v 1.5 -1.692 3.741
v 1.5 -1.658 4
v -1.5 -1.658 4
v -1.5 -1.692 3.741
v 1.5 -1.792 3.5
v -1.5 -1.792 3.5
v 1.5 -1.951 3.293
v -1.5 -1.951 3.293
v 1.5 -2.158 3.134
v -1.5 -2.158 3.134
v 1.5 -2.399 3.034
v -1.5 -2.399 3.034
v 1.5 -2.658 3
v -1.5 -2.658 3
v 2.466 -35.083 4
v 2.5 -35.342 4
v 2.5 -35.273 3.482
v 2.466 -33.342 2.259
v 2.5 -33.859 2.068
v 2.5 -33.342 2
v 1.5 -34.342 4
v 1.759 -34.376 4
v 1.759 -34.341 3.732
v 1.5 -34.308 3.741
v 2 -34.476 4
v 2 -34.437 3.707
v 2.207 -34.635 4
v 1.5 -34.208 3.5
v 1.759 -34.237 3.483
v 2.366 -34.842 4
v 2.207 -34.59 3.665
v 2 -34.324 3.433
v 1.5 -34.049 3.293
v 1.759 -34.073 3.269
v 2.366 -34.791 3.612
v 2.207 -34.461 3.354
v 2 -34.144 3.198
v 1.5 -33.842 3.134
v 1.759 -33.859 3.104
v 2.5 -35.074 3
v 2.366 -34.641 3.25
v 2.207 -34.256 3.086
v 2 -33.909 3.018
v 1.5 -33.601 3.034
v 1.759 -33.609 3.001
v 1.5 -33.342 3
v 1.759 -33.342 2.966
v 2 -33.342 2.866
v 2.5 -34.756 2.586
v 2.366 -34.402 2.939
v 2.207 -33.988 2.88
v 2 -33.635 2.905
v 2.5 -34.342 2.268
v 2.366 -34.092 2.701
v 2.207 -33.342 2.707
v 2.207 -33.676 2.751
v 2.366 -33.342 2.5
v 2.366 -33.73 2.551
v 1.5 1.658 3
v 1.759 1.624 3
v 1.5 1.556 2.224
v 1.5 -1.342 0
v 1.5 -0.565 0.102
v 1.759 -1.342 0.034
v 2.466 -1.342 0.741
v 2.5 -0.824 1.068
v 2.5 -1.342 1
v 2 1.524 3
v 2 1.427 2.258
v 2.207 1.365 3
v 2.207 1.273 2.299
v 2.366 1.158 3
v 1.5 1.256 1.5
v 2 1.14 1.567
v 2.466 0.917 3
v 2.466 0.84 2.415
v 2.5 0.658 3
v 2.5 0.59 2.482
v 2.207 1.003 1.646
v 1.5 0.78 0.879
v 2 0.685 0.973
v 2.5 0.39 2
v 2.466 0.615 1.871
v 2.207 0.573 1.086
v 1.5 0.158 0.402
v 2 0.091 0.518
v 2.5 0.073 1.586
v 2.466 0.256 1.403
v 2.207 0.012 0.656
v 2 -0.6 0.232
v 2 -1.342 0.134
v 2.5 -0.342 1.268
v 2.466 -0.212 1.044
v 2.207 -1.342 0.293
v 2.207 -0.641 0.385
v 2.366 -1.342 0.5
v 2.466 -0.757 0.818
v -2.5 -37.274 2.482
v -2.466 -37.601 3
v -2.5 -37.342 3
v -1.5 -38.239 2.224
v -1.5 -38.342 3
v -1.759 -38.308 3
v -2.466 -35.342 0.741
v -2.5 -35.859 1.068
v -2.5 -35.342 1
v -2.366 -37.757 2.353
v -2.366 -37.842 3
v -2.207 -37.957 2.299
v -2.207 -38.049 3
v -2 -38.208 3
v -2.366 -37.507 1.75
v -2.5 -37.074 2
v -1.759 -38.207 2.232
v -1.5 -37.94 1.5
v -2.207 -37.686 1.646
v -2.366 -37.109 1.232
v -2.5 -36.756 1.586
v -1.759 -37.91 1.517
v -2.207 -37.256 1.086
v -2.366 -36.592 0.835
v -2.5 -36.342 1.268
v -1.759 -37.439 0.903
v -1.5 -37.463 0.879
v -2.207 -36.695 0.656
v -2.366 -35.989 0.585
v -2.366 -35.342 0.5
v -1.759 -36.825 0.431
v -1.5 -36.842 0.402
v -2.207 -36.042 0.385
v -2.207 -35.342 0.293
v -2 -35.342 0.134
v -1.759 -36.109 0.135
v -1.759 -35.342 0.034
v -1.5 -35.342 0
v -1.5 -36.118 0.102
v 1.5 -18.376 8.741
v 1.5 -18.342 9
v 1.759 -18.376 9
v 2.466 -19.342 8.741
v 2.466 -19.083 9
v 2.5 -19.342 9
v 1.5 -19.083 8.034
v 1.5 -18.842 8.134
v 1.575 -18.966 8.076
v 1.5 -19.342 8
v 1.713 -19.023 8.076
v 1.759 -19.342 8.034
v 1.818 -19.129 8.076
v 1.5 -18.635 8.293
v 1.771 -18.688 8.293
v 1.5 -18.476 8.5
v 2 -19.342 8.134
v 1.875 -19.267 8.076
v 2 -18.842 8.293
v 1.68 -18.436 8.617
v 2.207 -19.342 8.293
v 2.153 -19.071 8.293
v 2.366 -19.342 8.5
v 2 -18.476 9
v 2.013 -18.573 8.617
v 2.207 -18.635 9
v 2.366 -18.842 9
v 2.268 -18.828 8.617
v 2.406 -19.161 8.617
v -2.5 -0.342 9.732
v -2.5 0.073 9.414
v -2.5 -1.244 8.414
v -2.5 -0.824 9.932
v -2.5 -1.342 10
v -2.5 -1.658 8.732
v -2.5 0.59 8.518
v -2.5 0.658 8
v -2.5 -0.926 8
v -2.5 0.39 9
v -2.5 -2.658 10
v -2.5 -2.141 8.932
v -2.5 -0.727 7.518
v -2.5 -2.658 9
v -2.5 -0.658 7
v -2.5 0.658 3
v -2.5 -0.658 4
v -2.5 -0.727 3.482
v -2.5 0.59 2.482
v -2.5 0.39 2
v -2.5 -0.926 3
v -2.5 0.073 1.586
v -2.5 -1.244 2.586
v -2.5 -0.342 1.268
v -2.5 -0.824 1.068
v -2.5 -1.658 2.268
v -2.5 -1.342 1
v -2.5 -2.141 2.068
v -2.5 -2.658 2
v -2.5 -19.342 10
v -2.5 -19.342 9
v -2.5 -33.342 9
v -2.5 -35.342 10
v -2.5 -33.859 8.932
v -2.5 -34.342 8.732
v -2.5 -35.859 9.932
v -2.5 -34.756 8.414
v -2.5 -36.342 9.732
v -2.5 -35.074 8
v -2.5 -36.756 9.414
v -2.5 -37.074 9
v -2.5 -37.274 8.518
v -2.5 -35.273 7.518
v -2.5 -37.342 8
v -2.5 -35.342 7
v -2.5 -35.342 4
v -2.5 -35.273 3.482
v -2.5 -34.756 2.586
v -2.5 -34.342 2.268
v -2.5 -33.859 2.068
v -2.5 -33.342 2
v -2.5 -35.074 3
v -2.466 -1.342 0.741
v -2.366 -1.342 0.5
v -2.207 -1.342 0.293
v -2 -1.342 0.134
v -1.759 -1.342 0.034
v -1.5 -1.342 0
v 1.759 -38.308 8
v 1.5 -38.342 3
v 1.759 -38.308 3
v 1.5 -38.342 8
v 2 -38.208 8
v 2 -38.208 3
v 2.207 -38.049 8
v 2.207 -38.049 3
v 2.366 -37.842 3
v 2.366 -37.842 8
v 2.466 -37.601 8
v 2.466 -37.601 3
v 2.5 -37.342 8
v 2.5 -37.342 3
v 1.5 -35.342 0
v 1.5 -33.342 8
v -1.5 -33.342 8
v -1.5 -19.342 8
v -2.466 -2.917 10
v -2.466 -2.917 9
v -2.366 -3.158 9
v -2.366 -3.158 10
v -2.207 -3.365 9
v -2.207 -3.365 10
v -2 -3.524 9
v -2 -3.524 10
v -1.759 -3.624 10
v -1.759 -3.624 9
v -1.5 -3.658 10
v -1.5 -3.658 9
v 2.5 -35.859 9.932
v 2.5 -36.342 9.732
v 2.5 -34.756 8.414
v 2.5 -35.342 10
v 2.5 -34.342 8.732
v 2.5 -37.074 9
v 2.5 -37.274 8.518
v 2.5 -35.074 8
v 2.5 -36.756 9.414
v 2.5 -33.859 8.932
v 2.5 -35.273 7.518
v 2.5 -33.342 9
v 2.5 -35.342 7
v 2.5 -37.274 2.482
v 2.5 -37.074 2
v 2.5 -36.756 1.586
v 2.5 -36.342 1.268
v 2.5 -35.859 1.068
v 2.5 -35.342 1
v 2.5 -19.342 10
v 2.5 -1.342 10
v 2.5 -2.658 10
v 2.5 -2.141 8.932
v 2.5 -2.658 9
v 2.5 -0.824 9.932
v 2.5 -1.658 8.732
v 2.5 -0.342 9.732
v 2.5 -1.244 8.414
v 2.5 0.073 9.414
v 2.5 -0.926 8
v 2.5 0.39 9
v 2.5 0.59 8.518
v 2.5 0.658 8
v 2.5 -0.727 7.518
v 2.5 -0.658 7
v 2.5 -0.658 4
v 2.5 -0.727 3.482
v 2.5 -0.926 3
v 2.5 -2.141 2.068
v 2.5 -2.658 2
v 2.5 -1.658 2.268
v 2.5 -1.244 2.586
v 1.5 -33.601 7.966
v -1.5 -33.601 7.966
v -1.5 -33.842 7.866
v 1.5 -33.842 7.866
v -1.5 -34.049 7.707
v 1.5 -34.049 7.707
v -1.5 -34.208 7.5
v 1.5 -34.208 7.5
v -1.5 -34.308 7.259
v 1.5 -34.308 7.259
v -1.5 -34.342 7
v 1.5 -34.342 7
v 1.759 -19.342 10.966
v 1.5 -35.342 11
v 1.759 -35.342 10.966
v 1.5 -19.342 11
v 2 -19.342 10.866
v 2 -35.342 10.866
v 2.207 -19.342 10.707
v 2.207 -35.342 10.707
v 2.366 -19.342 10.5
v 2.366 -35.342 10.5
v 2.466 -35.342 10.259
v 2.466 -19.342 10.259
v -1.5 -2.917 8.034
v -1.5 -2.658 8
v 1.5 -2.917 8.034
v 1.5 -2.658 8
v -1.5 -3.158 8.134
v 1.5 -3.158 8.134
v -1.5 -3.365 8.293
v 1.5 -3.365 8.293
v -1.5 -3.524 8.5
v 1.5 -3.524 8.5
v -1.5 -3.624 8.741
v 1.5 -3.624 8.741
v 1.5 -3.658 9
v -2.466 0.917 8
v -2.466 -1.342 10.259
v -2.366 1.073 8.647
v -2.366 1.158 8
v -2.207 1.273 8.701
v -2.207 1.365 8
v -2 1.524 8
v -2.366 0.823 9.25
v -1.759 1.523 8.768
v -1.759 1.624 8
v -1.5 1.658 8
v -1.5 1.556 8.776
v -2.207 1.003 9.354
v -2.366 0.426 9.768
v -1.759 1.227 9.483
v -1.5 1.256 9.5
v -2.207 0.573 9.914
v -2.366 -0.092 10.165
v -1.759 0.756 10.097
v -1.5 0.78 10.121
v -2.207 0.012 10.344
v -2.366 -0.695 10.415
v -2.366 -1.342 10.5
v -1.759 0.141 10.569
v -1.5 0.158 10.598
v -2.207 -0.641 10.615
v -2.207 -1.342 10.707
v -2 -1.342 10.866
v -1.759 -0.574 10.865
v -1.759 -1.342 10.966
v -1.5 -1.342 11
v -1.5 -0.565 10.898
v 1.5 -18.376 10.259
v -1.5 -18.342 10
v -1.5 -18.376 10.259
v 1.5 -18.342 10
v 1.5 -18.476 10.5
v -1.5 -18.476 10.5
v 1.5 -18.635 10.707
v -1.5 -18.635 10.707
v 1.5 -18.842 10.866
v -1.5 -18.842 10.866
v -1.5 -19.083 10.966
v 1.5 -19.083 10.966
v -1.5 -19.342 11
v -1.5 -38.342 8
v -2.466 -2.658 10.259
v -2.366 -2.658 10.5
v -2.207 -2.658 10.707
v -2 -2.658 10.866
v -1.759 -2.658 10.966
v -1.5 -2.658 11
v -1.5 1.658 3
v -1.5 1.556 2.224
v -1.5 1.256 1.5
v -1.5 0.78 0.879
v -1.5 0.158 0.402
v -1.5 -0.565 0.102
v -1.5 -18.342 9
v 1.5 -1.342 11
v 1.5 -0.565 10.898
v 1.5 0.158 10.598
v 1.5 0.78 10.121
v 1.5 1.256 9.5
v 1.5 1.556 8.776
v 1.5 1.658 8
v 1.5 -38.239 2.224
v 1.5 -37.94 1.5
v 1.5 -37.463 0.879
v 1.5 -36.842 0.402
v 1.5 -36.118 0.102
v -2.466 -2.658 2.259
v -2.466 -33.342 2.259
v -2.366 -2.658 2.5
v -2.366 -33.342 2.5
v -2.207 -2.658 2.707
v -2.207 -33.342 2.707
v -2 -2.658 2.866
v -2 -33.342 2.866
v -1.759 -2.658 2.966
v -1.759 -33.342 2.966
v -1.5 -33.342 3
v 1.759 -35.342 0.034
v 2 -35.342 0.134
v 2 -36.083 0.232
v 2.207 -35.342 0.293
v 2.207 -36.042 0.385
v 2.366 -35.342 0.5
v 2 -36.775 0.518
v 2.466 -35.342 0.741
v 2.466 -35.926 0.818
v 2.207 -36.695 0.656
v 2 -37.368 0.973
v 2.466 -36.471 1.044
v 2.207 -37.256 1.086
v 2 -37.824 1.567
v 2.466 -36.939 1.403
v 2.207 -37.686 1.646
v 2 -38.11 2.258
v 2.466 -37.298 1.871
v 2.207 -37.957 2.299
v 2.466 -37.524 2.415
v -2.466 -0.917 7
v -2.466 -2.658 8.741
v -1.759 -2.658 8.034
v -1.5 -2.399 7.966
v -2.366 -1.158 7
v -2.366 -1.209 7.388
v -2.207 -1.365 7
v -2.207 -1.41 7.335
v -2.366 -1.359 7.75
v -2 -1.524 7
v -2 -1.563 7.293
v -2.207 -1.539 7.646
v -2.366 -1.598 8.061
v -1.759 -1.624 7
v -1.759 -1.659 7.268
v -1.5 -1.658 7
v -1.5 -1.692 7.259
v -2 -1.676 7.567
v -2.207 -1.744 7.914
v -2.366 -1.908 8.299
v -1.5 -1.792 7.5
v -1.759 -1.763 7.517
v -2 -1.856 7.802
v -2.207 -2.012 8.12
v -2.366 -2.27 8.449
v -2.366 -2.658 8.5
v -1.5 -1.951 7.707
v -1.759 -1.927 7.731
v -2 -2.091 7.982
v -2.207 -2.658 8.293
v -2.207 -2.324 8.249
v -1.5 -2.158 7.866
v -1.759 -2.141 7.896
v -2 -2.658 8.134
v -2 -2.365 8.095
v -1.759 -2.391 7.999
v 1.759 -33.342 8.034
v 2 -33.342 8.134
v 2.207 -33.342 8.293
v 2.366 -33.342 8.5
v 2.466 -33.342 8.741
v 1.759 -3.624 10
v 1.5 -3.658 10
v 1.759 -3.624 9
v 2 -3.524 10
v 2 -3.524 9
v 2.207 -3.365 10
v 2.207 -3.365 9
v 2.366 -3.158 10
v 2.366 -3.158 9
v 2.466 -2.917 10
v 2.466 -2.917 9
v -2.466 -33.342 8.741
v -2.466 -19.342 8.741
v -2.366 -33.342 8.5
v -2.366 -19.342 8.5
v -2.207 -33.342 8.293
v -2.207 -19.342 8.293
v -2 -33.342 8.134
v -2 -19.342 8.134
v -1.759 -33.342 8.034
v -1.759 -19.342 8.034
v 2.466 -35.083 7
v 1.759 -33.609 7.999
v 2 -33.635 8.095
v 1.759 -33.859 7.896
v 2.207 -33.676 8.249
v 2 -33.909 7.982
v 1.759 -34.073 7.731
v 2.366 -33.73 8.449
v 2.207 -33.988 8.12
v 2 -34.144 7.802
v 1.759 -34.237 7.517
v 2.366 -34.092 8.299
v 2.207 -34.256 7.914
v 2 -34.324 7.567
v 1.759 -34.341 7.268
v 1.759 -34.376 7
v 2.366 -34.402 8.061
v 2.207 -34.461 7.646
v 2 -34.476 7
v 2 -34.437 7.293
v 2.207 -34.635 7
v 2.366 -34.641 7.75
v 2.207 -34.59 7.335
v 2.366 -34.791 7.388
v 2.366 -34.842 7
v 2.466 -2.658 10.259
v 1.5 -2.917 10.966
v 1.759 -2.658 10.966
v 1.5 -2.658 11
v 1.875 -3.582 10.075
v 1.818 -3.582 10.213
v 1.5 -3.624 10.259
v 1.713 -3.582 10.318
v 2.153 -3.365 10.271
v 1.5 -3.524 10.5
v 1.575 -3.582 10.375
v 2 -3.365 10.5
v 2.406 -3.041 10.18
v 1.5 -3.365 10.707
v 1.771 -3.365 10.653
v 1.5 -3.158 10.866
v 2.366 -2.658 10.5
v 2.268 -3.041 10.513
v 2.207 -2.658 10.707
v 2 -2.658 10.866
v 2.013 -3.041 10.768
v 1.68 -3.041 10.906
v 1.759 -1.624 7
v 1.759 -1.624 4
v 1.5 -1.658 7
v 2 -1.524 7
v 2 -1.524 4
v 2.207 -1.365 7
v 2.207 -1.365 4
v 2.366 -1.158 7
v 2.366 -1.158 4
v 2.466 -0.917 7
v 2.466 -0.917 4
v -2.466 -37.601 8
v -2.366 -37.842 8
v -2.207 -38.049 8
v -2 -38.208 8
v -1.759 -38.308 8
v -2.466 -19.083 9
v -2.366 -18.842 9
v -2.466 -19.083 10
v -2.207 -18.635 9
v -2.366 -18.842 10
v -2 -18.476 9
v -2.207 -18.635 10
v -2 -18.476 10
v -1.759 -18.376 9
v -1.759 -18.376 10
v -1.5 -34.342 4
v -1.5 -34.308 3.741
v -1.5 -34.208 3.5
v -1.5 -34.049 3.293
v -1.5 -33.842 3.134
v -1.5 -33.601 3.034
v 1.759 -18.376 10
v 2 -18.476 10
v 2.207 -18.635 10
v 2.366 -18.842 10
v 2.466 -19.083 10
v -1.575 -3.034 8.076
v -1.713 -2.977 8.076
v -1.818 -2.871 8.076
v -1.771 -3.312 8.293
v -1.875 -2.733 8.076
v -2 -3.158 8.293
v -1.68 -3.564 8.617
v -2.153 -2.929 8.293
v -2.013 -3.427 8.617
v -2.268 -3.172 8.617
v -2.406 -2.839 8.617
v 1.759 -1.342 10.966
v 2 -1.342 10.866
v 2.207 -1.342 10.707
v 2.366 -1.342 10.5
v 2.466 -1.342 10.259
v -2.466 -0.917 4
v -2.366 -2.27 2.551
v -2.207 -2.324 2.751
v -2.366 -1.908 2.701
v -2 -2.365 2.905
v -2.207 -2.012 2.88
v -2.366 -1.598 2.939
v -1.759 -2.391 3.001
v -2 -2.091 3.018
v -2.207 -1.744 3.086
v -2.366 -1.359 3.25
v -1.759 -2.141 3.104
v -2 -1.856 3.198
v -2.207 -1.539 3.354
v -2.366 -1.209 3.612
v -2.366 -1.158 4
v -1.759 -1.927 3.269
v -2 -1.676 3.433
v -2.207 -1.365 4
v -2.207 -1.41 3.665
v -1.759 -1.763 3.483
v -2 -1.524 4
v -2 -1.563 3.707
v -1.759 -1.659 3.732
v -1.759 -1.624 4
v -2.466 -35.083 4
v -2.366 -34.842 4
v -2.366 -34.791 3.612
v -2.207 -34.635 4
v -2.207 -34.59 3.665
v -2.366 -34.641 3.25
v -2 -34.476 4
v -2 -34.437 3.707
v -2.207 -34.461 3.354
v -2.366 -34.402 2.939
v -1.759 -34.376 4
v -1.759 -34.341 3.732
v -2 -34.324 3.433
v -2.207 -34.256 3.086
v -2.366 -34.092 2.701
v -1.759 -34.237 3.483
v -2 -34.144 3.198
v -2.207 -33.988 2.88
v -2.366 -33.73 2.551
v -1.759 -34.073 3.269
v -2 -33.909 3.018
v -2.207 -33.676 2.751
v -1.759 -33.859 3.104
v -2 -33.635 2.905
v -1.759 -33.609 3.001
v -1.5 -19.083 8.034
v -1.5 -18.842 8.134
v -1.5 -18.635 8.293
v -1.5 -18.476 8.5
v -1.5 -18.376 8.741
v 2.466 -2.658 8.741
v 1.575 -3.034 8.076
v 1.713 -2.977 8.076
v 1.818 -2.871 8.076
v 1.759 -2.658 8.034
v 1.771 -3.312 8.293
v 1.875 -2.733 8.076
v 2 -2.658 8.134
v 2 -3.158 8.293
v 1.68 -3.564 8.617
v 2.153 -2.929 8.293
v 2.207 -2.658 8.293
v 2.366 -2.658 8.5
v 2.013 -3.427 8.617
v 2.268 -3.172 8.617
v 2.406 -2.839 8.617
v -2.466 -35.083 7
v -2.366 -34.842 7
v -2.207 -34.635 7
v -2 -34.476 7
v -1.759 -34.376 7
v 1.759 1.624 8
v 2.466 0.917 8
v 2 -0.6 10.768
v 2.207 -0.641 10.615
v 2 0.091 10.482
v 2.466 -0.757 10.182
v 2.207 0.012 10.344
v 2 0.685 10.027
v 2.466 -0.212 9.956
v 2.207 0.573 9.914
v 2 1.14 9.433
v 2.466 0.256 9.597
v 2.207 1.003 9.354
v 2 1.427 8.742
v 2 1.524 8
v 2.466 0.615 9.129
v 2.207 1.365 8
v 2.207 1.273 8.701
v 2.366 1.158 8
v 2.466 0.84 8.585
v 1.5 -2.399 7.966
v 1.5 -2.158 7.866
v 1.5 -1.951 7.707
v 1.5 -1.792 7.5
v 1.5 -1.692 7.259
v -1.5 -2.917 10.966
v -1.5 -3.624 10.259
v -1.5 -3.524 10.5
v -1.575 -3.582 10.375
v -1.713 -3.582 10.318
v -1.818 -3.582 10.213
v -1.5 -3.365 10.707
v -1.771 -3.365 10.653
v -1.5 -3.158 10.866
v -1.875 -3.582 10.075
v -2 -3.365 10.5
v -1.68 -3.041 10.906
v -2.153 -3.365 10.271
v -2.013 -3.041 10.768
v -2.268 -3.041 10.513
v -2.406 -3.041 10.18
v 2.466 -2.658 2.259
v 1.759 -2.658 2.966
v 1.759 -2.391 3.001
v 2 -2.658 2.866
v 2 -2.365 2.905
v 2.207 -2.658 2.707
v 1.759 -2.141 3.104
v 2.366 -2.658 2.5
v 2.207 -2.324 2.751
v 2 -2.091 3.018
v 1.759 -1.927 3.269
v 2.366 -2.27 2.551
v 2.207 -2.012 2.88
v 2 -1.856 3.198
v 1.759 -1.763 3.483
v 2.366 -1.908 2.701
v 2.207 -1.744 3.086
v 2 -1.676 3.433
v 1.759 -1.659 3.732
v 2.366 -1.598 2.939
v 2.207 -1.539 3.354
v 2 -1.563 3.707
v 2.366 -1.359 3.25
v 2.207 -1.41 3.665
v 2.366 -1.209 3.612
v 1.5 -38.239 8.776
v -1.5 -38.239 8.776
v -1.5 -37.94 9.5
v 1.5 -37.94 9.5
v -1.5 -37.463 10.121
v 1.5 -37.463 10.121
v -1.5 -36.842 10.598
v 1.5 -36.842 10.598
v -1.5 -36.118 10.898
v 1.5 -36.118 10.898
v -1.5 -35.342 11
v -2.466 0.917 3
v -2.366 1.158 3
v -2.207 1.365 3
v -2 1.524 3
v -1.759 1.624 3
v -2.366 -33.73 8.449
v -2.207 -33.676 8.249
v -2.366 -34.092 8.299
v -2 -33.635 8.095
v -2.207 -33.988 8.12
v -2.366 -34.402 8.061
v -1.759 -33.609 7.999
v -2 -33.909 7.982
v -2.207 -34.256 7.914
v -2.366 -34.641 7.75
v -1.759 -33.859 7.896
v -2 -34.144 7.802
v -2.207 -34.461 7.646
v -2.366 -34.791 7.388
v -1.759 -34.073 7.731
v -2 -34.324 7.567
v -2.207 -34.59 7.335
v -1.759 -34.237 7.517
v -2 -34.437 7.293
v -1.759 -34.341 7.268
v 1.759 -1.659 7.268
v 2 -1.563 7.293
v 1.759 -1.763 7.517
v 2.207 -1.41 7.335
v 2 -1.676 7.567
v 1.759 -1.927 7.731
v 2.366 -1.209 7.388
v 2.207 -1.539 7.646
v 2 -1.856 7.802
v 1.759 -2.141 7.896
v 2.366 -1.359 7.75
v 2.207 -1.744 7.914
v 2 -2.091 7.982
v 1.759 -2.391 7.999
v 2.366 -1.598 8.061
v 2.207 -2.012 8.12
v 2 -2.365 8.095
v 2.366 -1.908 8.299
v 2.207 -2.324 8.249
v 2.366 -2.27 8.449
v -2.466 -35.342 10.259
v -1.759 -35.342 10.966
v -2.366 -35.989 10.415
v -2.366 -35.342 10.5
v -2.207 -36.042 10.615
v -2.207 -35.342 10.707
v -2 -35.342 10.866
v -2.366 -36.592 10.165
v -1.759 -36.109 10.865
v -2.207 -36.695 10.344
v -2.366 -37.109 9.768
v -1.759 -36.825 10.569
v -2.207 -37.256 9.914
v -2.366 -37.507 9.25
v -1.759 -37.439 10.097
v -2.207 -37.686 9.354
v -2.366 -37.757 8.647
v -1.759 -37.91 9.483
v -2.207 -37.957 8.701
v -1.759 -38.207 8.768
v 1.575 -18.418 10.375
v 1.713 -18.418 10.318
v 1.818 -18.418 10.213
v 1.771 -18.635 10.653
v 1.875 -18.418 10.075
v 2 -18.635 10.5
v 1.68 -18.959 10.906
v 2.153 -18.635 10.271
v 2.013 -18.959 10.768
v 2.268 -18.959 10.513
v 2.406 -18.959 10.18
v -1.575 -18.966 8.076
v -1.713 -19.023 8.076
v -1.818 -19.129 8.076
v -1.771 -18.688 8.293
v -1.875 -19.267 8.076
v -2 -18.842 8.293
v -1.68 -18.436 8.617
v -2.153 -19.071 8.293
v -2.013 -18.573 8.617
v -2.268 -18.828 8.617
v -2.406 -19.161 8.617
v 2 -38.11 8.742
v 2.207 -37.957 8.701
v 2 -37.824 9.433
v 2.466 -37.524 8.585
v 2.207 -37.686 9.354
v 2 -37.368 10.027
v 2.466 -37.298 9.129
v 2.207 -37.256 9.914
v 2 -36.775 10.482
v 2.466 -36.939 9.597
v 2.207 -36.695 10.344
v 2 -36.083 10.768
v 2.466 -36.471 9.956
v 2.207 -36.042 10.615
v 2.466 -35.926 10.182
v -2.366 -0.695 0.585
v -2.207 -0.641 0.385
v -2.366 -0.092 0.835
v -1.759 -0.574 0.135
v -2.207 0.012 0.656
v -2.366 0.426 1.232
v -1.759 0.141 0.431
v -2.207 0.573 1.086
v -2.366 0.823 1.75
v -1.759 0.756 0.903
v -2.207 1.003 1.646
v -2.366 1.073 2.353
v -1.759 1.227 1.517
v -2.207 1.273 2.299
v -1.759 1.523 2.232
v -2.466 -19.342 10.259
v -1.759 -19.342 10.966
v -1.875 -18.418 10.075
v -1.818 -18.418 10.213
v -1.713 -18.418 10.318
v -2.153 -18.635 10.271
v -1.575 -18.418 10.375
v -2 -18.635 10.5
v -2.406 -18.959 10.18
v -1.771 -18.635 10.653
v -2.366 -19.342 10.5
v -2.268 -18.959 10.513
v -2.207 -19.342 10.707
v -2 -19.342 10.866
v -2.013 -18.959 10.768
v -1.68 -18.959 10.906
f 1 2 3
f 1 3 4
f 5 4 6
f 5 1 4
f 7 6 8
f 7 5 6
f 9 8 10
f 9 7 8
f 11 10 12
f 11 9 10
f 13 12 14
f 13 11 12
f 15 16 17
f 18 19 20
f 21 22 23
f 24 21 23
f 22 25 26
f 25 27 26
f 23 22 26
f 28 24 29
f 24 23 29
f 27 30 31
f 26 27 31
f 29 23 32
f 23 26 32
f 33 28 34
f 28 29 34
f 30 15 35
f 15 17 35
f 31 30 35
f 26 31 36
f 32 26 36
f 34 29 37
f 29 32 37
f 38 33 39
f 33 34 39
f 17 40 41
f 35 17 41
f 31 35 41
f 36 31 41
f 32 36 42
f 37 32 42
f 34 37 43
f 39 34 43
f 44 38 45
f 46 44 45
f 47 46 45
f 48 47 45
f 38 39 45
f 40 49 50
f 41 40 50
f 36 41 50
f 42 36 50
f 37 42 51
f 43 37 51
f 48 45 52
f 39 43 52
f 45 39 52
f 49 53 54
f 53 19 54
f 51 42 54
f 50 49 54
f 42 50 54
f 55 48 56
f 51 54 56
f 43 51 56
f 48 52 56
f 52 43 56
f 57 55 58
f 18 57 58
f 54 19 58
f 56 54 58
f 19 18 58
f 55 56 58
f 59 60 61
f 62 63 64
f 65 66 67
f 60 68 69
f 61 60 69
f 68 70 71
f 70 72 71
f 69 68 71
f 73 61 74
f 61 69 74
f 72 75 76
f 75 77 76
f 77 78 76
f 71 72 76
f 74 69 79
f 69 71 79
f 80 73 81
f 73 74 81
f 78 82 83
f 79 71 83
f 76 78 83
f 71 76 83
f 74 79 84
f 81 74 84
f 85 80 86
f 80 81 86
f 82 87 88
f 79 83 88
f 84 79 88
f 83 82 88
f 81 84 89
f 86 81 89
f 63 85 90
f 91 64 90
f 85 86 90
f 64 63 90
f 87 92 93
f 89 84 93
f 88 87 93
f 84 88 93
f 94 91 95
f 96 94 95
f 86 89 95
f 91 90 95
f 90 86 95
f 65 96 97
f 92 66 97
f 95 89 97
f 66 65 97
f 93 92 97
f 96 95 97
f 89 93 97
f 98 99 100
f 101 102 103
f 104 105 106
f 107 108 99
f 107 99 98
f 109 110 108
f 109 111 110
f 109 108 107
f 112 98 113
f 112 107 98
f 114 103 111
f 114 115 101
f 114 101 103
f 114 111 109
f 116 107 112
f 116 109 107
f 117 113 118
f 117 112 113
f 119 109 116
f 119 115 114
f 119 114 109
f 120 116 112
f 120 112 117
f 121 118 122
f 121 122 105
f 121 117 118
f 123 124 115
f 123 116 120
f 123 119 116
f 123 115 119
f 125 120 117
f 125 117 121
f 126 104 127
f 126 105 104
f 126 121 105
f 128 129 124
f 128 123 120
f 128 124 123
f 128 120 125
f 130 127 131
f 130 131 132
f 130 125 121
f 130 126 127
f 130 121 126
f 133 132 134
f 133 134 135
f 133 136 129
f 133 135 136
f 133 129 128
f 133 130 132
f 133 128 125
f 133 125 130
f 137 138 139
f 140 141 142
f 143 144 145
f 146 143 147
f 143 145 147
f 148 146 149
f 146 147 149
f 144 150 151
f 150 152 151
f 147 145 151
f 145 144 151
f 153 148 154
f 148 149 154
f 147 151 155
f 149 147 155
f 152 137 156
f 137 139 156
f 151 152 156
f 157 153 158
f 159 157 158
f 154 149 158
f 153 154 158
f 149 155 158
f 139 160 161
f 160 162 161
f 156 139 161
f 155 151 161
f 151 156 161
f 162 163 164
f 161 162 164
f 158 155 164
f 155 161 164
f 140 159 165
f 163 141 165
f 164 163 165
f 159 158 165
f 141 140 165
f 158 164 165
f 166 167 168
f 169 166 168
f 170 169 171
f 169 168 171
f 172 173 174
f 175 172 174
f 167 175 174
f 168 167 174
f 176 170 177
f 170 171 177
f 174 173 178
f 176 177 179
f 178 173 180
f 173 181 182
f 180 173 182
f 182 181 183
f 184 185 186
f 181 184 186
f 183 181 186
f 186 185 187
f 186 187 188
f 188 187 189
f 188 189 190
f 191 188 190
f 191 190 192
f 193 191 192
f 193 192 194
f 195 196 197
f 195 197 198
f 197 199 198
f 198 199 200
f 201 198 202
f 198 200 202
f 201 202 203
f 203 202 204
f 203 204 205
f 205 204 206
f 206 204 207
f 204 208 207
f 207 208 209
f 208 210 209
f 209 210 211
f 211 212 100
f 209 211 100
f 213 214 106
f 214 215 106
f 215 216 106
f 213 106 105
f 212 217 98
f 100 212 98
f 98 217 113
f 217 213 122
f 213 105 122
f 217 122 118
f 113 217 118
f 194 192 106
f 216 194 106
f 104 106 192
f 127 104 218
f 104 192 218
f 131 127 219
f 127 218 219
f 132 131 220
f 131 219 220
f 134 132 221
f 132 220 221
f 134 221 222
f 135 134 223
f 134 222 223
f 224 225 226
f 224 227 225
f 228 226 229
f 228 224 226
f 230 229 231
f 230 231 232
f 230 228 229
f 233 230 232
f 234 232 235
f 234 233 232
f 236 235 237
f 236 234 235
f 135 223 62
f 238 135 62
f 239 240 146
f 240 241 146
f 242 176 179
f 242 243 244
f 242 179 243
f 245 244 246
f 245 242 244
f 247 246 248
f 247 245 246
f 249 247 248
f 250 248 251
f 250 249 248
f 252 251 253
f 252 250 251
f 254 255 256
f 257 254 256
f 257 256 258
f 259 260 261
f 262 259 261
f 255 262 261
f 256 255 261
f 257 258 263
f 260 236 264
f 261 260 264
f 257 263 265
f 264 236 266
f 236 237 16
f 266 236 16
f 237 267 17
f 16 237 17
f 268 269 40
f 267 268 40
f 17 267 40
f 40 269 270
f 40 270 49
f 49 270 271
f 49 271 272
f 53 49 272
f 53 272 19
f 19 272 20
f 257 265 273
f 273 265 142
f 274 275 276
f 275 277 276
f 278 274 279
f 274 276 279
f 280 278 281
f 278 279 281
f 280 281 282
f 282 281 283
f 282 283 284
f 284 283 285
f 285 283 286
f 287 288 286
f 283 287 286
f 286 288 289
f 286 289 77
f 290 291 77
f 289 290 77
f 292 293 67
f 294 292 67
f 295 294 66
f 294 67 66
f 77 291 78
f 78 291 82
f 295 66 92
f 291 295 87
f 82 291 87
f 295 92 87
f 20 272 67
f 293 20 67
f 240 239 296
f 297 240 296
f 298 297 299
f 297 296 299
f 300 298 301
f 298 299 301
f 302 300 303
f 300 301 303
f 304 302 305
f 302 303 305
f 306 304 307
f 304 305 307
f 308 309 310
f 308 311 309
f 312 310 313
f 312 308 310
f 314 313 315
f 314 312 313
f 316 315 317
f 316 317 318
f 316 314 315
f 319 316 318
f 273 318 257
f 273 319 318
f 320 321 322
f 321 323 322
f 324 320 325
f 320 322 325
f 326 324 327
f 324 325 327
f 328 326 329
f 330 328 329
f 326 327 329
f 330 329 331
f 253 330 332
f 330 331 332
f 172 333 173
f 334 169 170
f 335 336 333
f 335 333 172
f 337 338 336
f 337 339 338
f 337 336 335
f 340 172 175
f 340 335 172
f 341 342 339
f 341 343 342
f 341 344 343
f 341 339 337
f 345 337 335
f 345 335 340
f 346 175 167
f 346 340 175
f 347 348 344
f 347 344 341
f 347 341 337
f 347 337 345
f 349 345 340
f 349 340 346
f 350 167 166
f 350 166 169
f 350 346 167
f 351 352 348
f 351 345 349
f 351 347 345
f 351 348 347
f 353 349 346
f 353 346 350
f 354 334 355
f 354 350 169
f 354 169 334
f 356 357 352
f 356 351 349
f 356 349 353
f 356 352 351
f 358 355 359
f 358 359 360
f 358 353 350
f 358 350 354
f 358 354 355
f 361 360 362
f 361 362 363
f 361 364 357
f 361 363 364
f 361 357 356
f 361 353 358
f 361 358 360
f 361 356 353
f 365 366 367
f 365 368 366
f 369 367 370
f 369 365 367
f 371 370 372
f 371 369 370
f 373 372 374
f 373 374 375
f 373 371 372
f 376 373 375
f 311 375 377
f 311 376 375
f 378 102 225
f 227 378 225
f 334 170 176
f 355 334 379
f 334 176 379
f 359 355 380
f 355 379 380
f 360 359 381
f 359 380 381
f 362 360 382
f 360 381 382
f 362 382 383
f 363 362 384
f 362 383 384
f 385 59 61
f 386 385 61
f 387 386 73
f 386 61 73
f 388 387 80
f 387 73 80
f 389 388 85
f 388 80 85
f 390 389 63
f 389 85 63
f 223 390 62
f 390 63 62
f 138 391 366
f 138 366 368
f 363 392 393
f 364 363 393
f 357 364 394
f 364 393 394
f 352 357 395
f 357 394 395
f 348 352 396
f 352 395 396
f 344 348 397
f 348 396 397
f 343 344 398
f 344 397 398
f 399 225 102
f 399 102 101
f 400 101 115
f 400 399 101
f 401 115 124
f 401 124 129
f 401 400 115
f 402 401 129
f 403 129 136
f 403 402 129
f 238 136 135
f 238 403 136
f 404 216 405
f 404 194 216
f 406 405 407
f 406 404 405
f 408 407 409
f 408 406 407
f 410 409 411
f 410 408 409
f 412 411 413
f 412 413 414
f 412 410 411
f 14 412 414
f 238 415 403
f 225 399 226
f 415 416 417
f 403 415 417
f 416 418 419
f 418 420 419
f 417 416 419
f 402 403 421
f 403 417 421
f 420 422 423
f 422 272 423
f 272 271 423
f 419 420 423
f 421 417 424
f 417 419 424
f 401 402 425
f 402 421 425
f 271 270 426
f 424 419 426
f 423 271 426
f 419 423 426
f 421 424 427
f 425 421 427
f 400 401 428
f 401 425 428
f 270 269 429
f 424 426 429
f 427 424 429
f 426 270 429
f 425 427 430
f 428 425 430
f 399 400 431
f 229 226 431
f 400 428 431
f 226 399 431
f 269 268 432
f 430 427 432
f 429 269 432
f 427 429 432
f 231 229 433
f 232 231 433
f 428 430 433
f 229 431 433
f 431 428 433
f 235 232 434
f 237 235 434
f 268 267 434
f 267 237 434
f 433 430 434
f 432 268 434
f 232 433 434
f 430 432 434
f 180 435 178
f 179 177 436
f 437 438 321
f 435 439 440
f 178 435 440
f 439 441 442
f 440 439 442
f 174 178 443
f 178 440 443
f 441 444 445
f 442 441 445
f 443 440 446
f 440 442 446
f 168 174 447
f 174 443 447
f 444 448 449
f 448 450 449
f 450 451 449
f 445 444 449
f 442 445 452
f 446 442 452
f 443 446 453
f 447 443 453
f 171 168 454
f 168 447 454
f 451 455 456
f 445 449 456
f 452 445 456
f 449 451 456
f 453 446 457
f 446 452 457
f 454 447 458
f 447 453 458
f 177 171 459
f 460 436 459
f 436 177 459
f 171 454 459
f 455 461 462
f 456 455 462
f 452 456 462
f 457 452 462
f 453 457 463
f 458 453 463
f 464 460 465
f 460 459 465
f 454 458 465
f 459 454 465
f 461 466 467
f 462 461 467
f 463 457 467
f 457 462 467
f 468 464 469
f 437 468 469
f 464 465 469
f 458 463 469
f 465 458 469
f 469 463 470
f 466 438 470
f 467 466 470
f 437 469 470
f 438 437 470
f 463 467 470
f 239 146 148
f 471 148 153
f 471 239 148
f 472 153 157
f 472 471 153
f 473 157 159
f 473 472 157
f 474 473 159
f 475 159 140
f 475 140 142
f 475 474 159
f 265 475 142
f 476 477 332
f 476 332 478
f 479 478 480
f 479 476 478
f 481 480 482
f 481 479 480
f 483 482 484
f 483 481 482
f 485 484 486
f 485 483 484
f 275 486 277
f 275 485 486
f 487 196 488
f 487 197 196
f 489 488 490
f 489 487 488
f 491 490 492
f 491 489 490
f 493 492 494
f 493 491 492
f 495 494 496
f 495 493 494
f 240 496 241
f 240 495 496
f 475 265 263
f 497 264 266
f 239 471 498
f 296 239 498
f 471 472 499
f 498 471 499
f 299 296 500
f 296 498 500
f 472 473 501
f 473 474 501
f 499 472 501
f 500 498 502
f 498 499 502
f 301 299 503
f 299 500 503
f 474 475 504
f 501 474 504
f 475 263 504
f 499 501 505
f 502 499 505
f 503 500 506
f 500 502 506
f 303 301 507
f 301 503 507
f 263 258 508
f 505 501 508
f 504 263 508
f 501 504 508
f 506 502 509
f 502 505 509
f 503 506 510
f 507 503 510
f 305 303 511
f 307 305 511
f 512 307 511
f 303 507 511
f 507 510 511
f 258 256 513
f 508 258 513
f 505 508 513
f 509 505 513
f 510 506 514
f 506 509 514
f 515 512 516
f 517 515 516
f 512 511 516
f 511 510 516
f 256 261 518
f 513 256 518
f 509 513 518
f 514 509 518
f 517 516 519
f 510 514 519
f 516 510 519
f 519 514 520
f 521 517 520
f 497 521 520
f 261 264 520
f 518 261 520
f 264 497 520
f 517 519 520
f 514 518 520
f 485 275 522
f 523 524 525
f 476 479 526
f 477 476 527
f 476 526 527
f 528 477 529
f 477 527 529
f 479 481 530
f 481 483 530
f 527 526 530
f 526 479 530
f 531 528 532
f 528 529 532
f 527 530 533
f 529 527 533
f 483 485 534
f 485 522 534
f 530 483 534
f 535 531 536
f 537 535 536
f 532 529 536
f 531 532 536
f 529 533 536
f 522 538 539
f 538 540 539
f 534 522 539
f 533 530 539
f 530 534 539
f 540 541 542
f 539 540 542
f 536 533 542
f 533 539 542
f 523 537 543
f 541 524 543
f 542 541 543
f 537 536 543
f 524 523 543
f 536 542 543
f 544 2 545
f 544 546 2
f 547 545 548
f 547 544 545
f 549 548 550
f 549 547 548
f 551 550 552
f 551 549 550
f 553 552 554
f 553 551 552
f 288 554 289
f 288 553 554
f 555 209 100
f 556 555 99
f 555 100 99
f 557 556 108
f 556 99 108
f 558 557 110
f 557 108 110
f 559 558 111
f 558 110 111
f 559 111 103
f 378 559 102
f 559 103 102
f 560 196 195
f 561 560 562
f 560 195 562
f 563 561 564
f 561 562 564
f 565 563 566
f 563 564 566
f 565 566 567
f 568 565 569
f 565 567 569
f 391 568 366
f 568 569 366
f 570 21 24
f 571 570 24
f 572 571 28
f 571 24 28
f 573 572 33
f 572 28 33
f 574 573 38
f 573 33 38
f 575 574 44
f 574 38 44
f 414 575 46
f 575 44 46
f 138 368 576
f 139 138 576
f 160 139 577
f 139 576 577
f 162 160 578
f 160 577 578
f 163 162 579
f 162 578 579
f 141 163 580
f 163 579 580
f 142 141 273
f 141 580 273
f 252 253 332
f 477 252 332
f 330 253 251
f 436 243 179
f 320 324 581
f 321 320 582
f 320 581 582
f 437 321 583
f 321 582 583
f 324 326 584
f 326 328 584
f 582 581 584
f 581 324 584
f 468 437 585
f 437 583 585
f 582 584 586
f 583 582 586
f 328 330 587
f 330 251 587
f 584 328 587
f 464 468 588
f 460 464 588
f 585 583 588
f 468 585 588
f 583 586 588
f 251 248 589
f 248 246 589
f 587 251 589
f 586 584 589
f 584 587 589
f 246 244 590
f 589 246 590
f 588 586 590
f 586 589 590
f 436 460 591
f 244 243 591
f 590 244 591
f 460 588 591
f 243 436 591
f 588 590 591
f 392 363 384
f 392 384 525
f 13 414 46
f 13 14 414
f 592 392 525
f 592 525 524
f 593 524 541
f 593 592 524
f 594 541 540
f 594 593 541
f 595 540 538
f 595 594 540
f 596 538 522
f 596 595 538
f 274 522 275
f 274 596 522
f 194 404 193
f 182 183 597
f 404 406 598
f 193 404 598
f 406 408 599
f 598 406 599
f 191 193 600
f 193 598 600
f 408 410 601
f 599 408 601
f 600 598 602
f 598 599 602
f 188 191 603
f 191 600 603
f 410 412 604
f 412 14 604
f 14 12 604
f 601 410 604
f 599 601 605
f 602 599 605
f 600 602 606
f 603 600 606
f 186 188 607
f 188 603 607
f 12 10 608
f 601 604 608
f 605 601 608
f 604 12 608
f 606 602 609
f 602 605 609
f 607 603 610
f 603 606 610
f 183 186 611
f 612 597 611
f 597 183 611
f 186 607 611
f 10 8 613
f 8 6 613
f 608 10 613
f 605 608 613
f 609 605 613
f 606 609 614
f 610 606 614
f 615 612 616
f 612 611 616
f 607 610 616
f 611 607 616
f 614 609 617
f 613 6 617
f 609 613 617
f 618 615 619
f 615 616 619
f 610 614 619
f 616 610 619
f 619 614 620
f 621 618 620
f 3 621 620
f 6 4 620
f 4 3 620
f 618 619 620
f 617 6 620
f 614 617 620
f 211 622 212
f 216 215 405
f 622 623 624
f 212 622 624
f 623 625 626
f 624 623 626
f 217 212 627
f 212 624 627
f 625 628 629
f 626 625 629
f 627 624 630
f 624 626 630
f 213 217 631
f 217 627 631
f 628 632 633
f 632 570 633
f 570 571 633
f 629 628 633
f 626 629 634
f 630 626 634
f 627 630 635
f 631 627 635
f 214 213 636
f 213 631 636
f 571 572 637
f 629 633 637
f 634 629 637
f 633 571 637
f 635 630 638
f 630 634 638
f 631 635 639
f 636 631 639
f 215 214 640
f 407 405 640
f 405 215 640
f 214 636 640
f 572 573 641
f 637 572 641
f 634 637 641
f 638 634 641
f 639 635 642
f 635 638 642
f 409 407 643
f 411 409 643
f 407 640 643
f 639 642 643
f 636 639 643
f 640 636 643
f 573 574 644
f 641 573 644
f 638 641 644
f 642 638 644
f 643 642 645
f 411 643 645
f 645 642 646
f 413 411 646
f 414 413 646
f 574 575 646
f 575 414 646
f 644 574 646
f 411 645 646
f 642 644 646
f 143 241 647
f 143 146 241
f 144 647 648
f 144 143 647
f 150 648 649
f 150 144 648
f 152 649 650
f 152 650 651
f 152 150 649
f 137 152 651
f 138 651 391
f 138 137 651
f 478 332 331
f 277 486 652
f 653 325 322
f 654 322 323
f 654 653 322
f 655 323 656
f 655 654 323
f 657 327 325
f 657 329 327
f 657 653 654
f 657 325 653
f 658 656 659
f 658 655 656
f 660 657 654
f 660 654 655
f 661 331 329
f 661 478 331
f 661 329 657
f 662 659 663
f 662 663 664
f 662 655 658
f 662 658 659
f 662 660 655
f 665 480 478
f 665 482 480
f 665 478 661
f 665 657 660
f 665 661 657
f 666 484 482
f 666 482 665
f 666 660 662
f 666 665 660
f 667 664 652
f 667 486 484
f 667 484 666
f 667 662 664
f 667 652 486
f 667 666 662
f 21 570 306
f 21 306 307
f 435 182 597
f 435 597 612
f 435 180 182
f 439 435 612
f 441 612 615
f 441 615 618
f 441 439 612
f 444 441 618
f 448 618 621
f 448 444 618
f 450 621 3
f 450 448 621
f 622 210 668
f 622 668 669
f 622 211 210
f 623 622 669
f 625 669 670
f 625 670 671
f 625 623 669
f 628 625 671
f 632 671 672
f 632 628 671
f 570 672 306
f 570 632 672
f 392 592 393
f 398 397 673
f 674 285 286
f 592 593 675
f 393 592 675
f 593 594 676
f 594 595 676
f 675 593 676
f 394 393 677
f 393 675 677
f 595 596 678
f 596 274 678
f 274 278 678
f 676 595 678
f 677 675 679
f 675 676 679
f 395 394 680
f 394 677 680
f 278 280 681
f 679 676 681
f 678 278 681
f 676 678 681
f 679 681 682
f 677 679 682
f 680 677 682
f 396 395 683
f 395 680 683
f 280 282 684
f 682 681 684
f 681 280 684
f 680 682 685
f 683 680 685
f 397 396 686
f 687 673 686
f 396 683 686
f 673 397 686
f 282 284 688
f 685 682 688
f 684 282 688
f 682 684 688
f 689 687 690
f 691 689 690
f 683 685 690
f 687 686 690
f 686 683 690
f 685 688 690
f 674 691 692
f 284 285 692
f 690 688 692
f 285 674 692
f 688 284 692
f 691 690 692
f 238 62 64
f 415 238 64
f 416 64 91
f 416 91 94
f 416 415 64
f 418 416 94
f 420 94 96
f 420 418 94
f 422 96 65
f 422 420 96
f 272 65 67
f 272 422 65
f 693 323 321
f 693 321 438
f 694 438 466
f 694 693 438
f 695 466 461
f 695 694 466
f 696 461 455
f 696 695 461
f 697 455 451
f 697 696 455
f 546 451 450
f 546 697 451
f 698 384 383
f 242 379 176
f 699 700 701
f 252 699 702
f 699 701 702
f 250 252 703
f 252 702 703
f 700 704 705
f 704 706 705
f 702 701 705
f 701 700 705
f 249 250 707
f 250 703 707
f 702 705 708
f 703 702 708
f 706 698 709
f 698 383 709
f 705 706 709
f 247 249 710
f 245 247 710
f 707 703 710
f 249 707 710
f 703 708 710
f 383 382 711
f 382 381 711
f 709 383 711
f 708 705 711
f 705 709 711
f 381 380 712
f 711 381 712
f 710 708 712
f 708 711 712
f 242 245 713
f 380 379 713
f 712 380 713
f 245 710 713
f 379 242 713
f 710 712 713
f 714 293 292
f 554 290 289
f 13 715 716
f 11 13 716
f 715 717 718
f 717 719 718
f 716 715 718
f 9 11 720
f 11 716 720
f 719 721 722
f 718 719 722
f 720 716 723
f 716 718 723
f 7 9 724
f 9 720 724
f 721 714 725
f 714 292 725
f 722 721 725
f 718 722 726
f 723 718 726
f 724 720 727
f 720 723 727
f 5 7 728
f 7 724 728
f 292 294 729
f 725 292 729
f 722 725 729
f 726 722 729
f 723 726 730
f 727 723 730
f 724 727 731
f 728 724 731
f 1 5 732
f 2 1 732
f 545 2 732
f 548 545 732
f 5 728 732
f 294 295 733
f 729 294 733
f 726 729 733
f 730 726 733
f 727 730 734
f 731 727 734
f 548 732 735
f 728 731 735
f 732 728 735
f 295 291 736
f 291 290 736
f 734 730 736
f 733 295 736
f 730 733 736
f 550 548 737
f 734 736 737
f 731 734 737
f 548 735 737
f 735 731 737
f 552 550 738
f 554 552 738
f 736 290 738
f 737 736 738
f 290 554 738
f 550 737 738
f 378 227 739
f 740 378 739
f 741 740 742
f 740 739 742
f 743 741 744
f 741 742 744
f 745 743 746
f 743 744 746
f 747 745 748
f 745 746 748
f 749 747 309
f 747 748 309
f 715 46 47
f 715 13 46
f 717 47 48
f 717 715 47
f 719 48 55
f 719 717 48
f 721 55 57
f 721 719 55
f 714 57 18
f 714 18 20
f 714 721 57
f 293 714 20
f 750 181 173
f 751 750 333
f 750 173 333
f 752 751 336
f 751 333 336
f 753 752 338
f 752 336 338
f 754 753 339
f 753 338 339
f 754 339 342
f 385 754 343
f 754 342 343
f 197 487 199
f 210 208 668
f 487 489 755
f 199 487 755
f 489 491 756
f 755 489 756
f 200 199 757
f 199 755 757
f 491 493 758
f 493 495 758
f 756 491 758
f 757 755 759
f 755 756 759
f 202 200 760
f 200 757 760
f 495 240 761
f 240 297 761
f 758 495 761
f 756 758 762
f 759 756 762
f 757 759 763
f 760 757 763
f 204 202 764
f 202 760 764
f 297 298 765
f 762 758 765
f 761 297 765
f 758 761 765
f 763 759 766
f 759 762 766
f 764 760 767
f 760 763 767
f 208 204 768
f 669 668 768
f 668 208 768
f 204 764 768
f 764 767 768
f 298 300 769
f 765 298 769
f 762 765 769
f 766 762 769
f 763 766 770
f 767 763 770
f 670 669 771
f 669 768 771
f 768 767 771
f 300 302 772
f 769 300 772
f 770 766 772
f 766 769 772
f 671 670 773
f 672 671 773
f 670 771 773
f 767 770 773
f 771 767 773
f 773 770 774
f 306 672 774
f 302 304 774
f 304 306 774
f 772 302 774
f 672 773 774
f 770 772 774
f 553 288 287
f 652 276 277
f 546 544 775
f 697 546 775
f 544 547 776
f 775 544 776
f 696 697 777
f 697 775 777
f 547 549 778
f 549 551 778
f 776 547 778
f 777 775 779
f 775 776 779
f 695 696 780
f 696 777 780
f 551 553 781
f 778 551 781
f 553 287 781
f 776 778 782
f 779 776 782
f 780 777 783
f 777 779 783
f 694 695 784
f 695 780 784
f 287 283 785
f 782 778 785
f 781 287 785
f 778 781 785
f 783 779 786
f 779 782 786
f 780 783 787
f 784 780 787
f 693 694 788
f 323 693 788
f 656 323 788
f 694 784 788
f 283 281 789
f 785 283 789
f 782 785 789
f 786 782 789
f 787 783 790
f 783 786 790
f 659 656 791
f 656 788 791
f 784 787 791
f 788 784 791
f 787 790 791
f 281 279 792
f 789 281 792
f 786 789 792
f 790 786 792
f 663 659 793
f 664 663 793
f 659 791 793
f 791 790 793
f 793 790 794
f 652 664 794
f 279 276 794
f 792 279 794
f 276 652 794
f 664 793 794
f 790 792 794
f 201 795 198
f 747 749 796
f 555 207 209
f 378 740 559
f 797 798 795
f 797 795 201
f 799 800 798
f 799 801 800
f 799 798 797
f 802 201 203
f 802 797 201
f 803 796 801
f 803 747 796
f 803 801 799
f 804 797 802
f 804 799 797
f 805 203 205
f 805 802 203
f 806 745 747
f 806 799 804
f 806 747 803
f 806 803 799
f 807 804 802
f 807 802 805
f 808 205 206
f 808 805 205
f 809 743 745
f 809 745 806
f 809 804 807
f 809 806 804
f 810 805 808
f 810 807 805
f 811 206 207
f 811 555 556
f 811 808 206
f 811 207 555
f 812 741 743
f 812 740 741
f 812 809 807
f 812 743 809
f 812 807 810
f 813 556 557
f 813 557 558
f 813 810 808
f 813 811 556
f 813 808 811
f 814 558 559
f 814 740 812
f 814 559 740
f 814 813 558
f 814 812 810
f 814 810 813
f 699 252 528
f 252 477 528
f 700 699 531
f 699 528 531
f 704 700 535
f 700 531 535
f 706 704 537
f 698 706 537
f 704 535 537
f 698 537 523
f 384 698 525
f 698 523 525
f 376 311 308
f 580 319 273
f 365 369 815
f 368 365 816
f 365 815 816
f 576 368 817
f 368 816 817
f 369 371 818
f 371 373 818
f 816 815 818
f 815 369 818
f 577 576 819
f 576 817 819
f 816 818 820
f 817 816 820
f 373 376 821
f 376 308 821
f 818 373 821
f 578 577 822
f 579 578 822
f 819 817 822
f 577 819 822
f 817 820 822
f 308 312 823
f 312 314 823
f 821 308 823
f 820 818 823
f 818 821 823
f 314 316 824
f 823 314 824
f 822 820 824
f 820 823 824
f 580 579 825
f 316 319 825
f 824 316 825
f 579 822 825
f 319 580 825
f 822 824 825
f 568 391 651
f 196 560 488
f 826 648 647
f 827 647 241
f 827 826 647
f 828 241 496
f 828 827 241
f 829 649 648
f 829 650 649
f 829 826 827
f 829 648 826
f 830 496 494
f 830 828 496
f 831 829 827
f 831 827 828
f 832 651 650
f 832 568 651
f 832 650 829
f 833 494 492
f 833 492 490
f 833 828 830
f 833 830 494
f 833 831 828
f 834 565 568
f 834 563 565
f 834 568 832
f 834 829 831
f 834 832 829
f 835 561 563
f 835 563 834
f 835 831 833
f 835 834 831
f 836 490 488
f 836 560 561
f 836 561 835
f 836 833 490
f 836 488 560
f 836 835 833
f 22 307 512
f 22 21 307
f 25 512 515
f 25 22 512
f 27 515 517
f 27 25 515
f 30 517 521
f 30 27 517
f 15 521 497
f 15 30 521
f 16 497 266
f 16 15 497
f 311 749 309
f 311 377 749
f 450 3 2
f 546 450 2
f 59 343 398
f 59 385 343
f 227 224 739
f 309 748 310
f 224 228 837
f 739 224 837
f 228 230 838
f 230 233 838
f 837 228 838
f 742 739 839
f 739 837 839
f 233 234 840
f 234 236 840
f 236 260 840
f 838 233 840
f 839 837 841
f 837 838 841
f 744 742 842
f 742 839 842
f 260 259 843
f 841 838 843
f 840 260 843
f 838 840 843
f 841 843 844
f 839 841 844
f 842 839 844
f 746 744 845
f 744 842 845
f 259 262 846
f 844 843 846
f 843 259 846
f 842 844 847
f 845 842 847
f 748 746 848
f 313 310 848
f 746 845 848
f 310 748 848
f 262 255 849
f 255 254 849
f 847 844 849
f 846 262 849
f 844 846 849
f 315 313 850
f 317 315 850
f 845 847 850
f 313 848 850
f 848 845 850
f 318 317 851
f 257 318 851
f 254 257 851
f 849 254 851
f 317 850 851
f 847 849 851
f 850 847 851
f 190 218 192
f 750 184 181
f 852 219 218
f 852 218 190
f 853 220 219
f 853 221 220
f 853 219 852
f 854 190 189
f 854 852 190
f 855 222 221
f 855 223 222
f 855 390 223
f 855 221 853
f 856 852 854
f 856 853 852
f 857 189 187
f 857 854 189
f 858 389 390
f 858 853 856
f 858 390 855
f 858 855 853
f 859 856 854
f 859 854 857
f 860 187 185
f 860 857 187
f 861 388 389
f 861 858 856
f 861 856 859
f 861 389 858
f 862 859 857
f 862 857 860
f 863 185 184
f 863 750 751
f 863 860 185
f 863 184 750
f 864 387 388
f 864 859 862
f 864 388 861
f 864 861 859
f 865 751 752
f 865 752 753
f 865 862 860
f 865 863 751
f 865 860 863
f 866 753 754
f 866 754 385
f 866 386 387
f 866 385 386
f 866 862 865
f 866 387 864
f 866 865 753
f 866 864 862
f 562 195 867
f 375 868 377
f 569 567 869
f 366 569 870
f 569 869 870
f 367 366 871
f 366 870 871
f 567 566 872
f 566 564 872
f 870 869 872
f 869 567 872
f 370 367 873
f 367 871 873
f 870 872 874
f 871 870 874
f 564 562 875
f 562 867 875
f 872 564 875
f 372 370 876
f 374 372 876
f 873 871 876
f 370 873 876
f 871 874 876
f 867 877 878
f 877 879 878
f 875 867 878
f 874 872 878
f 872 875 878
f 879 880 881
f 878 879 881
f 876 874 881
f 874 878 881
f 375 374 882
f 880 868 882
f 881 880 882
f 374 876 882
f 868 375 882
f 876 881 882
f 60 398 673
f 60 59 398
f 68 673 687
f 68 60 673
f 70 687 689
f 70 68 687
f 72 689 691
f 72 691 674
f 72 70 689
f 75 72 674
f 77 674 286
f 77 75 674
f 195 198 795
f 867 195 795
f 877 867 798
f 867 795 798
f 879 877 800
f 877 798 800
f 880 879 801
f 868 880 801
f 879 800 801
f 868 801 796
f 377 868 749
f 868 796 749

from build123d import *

# Parameters (mm, degrees)
F0_W     = 5
F0_H     = 3.3166247904
F0_H_2   = 16
F0_H_3   = 14.6833752096
F0_H_4   = 2
F1_DEPTH = 3
F2_DEPTH = 11
F3_START = 3
F3_DEPTH = 5
F4_R     = 3
F5_F1_R  = 1
F5_F2_R  = 0.9999


# Not quite as in the source:
# - a fillet or chamfer is up to 0.001 mm smaller than in the source, because OpenCascade refuses the exact size


with BuildPart() as f1:
    # F0 (on Top) → F1 (new body)
    with BuildSketch(Plane.XY):
        Rectangle(F0_W, F0_H)
        with Locations((0, -26.3416876048)):
            Rectangle(F0_W, F0_H_2)
        with Locations((0, -11)):
            Rectangle(F0_W, F0_H_3)
        with Locations((0, -2.6583123952)):
            Rectangle(F0_W, F0_H_4)
        Polygon((2.5, -34.3416876048), (-2.5, -34.3416876048), (-2.5, -38.3416876048), (0, -38.3416876048), (2.5, -38.3416876048), align=None)
    extrude(amount=F1_DEPTH)

    # F0 (on Top) → F2 (join)
    with BuildSketch(Plane.XY):
        Rectangle(F0_W, F0_H)
        with Locations((0, -2.6583123952)):
            Rectangle(F0_W, F0_H_4)
        Polygon((2.5, -34.3416876048), (-2.5, -34.3416876048), (-2.5, -38.3416876048), (0, -38.3416876048), (2.5, -38.3416876048), align=None)
        with Locations((0, -26.3416876048)):
            Rectangle(F0_W, F0_H_2)
    extrude(amount=F2_DEPTH)

    # F0 (on Top) → F3 (cut)
    with BuildSketch(Plane.XY.offset(F3_START)):
        with Locations((0, -2.6583123952)):
            Rectangle(F0_W, F0_H_4)
        with Locations((0, -26.3416876048)):
            Rectangle(F0_W, F0_H_2)
    extrude(amount=F3_DEPTH, mode=Mode.SUBTRACT)

    # F4
    f4_edges = [f1.edges().sort_by_distance(p)[0] for p in [
        (0, 1.658312, 11),
        (0, -38.341688, 11),
        (0, -38.341688, 0),
        (0, 1.658312, 0),
    ]]
    fillet(f4_edges, radius=F4_R)

    # F5: fillet of radius 1 on 16 edges, made by hand

    # F5_f1
    f5_f1_edges = [f1.edges().sort_by_distance(p)[0] for p in [
        (0, -34.3416876048, 8),
        (0, -34.3416876048, 3),
        (0, -1.6583123952, 3),
        (0, -1.6583123952, 8),
    ]]
    fillet(f5_f1_edges, radius=F5_F1_R)

    # F5_f2 (radius 1 in the source; OpenCascade refuses exactly that, so slightly less here)
    f5_f2_edges = [f1.edges().sort_by_distance(p)[0] for p in [
        (-2.5, -26.8416876048, 11),
        (2.5, -26.8416876048, 11),
        (2.5, -3.6583123952, 9.5),
        (0, -3.6583123952, 11),
        (-2.5, -3.6583123952, 9.5),
        (0, -3.6583123952, 8),
        (-2.5, -18.3416876048, 9.5),
        (0, -18.3416876048, 11),
        (2.5, -18.3416876048, 9.5),
        (0, -18.3416876048, 8),
        (2.5, -18, 3),
        (-2.5, -18, 3),
        (2.5, -37.4630079484, 10.1213203436),
        (2.5, -38.3416876048, 5.5),
        (2.5, -37.4630079484, 0.8786796564),
        (2.5, -18.3416876048, 0),
        (2.5, 0.7796327387, 0.8786796564),
        (2.5, 1.6583123952, 5.5),
        (2.5, 0.7796327387, 10.1213203436),
        (2.5, -2.5, 11),
        (-2.5, -37.4630079484, 10.1213203436),
        (-2.5, -38.3416876048, 5.5),
        (-2.5, -37.4630079484, 0.8786796564),
        (-2.5, -18.3416876048, 0),
        (-2.5, 0.7796327387, 0.8786796564),
        (-2.5, 1.6583123952, 5.5),
        (-2.5, 0.7796327387, 10.1213203436),
        (-2.5, -2.5, 11),
        (-2.5, -34.048794386, 3.2928932188),
        (-2.5, -1.951205614, 3.2928932188),
        (2.5, -1.951205614, 3.2928932188),
        (2.5, -34.048794386, 3.2928932188),
    ]]
    fillet(f5_f2_edges, radius=F5_F2_R)


solid = f1.part
